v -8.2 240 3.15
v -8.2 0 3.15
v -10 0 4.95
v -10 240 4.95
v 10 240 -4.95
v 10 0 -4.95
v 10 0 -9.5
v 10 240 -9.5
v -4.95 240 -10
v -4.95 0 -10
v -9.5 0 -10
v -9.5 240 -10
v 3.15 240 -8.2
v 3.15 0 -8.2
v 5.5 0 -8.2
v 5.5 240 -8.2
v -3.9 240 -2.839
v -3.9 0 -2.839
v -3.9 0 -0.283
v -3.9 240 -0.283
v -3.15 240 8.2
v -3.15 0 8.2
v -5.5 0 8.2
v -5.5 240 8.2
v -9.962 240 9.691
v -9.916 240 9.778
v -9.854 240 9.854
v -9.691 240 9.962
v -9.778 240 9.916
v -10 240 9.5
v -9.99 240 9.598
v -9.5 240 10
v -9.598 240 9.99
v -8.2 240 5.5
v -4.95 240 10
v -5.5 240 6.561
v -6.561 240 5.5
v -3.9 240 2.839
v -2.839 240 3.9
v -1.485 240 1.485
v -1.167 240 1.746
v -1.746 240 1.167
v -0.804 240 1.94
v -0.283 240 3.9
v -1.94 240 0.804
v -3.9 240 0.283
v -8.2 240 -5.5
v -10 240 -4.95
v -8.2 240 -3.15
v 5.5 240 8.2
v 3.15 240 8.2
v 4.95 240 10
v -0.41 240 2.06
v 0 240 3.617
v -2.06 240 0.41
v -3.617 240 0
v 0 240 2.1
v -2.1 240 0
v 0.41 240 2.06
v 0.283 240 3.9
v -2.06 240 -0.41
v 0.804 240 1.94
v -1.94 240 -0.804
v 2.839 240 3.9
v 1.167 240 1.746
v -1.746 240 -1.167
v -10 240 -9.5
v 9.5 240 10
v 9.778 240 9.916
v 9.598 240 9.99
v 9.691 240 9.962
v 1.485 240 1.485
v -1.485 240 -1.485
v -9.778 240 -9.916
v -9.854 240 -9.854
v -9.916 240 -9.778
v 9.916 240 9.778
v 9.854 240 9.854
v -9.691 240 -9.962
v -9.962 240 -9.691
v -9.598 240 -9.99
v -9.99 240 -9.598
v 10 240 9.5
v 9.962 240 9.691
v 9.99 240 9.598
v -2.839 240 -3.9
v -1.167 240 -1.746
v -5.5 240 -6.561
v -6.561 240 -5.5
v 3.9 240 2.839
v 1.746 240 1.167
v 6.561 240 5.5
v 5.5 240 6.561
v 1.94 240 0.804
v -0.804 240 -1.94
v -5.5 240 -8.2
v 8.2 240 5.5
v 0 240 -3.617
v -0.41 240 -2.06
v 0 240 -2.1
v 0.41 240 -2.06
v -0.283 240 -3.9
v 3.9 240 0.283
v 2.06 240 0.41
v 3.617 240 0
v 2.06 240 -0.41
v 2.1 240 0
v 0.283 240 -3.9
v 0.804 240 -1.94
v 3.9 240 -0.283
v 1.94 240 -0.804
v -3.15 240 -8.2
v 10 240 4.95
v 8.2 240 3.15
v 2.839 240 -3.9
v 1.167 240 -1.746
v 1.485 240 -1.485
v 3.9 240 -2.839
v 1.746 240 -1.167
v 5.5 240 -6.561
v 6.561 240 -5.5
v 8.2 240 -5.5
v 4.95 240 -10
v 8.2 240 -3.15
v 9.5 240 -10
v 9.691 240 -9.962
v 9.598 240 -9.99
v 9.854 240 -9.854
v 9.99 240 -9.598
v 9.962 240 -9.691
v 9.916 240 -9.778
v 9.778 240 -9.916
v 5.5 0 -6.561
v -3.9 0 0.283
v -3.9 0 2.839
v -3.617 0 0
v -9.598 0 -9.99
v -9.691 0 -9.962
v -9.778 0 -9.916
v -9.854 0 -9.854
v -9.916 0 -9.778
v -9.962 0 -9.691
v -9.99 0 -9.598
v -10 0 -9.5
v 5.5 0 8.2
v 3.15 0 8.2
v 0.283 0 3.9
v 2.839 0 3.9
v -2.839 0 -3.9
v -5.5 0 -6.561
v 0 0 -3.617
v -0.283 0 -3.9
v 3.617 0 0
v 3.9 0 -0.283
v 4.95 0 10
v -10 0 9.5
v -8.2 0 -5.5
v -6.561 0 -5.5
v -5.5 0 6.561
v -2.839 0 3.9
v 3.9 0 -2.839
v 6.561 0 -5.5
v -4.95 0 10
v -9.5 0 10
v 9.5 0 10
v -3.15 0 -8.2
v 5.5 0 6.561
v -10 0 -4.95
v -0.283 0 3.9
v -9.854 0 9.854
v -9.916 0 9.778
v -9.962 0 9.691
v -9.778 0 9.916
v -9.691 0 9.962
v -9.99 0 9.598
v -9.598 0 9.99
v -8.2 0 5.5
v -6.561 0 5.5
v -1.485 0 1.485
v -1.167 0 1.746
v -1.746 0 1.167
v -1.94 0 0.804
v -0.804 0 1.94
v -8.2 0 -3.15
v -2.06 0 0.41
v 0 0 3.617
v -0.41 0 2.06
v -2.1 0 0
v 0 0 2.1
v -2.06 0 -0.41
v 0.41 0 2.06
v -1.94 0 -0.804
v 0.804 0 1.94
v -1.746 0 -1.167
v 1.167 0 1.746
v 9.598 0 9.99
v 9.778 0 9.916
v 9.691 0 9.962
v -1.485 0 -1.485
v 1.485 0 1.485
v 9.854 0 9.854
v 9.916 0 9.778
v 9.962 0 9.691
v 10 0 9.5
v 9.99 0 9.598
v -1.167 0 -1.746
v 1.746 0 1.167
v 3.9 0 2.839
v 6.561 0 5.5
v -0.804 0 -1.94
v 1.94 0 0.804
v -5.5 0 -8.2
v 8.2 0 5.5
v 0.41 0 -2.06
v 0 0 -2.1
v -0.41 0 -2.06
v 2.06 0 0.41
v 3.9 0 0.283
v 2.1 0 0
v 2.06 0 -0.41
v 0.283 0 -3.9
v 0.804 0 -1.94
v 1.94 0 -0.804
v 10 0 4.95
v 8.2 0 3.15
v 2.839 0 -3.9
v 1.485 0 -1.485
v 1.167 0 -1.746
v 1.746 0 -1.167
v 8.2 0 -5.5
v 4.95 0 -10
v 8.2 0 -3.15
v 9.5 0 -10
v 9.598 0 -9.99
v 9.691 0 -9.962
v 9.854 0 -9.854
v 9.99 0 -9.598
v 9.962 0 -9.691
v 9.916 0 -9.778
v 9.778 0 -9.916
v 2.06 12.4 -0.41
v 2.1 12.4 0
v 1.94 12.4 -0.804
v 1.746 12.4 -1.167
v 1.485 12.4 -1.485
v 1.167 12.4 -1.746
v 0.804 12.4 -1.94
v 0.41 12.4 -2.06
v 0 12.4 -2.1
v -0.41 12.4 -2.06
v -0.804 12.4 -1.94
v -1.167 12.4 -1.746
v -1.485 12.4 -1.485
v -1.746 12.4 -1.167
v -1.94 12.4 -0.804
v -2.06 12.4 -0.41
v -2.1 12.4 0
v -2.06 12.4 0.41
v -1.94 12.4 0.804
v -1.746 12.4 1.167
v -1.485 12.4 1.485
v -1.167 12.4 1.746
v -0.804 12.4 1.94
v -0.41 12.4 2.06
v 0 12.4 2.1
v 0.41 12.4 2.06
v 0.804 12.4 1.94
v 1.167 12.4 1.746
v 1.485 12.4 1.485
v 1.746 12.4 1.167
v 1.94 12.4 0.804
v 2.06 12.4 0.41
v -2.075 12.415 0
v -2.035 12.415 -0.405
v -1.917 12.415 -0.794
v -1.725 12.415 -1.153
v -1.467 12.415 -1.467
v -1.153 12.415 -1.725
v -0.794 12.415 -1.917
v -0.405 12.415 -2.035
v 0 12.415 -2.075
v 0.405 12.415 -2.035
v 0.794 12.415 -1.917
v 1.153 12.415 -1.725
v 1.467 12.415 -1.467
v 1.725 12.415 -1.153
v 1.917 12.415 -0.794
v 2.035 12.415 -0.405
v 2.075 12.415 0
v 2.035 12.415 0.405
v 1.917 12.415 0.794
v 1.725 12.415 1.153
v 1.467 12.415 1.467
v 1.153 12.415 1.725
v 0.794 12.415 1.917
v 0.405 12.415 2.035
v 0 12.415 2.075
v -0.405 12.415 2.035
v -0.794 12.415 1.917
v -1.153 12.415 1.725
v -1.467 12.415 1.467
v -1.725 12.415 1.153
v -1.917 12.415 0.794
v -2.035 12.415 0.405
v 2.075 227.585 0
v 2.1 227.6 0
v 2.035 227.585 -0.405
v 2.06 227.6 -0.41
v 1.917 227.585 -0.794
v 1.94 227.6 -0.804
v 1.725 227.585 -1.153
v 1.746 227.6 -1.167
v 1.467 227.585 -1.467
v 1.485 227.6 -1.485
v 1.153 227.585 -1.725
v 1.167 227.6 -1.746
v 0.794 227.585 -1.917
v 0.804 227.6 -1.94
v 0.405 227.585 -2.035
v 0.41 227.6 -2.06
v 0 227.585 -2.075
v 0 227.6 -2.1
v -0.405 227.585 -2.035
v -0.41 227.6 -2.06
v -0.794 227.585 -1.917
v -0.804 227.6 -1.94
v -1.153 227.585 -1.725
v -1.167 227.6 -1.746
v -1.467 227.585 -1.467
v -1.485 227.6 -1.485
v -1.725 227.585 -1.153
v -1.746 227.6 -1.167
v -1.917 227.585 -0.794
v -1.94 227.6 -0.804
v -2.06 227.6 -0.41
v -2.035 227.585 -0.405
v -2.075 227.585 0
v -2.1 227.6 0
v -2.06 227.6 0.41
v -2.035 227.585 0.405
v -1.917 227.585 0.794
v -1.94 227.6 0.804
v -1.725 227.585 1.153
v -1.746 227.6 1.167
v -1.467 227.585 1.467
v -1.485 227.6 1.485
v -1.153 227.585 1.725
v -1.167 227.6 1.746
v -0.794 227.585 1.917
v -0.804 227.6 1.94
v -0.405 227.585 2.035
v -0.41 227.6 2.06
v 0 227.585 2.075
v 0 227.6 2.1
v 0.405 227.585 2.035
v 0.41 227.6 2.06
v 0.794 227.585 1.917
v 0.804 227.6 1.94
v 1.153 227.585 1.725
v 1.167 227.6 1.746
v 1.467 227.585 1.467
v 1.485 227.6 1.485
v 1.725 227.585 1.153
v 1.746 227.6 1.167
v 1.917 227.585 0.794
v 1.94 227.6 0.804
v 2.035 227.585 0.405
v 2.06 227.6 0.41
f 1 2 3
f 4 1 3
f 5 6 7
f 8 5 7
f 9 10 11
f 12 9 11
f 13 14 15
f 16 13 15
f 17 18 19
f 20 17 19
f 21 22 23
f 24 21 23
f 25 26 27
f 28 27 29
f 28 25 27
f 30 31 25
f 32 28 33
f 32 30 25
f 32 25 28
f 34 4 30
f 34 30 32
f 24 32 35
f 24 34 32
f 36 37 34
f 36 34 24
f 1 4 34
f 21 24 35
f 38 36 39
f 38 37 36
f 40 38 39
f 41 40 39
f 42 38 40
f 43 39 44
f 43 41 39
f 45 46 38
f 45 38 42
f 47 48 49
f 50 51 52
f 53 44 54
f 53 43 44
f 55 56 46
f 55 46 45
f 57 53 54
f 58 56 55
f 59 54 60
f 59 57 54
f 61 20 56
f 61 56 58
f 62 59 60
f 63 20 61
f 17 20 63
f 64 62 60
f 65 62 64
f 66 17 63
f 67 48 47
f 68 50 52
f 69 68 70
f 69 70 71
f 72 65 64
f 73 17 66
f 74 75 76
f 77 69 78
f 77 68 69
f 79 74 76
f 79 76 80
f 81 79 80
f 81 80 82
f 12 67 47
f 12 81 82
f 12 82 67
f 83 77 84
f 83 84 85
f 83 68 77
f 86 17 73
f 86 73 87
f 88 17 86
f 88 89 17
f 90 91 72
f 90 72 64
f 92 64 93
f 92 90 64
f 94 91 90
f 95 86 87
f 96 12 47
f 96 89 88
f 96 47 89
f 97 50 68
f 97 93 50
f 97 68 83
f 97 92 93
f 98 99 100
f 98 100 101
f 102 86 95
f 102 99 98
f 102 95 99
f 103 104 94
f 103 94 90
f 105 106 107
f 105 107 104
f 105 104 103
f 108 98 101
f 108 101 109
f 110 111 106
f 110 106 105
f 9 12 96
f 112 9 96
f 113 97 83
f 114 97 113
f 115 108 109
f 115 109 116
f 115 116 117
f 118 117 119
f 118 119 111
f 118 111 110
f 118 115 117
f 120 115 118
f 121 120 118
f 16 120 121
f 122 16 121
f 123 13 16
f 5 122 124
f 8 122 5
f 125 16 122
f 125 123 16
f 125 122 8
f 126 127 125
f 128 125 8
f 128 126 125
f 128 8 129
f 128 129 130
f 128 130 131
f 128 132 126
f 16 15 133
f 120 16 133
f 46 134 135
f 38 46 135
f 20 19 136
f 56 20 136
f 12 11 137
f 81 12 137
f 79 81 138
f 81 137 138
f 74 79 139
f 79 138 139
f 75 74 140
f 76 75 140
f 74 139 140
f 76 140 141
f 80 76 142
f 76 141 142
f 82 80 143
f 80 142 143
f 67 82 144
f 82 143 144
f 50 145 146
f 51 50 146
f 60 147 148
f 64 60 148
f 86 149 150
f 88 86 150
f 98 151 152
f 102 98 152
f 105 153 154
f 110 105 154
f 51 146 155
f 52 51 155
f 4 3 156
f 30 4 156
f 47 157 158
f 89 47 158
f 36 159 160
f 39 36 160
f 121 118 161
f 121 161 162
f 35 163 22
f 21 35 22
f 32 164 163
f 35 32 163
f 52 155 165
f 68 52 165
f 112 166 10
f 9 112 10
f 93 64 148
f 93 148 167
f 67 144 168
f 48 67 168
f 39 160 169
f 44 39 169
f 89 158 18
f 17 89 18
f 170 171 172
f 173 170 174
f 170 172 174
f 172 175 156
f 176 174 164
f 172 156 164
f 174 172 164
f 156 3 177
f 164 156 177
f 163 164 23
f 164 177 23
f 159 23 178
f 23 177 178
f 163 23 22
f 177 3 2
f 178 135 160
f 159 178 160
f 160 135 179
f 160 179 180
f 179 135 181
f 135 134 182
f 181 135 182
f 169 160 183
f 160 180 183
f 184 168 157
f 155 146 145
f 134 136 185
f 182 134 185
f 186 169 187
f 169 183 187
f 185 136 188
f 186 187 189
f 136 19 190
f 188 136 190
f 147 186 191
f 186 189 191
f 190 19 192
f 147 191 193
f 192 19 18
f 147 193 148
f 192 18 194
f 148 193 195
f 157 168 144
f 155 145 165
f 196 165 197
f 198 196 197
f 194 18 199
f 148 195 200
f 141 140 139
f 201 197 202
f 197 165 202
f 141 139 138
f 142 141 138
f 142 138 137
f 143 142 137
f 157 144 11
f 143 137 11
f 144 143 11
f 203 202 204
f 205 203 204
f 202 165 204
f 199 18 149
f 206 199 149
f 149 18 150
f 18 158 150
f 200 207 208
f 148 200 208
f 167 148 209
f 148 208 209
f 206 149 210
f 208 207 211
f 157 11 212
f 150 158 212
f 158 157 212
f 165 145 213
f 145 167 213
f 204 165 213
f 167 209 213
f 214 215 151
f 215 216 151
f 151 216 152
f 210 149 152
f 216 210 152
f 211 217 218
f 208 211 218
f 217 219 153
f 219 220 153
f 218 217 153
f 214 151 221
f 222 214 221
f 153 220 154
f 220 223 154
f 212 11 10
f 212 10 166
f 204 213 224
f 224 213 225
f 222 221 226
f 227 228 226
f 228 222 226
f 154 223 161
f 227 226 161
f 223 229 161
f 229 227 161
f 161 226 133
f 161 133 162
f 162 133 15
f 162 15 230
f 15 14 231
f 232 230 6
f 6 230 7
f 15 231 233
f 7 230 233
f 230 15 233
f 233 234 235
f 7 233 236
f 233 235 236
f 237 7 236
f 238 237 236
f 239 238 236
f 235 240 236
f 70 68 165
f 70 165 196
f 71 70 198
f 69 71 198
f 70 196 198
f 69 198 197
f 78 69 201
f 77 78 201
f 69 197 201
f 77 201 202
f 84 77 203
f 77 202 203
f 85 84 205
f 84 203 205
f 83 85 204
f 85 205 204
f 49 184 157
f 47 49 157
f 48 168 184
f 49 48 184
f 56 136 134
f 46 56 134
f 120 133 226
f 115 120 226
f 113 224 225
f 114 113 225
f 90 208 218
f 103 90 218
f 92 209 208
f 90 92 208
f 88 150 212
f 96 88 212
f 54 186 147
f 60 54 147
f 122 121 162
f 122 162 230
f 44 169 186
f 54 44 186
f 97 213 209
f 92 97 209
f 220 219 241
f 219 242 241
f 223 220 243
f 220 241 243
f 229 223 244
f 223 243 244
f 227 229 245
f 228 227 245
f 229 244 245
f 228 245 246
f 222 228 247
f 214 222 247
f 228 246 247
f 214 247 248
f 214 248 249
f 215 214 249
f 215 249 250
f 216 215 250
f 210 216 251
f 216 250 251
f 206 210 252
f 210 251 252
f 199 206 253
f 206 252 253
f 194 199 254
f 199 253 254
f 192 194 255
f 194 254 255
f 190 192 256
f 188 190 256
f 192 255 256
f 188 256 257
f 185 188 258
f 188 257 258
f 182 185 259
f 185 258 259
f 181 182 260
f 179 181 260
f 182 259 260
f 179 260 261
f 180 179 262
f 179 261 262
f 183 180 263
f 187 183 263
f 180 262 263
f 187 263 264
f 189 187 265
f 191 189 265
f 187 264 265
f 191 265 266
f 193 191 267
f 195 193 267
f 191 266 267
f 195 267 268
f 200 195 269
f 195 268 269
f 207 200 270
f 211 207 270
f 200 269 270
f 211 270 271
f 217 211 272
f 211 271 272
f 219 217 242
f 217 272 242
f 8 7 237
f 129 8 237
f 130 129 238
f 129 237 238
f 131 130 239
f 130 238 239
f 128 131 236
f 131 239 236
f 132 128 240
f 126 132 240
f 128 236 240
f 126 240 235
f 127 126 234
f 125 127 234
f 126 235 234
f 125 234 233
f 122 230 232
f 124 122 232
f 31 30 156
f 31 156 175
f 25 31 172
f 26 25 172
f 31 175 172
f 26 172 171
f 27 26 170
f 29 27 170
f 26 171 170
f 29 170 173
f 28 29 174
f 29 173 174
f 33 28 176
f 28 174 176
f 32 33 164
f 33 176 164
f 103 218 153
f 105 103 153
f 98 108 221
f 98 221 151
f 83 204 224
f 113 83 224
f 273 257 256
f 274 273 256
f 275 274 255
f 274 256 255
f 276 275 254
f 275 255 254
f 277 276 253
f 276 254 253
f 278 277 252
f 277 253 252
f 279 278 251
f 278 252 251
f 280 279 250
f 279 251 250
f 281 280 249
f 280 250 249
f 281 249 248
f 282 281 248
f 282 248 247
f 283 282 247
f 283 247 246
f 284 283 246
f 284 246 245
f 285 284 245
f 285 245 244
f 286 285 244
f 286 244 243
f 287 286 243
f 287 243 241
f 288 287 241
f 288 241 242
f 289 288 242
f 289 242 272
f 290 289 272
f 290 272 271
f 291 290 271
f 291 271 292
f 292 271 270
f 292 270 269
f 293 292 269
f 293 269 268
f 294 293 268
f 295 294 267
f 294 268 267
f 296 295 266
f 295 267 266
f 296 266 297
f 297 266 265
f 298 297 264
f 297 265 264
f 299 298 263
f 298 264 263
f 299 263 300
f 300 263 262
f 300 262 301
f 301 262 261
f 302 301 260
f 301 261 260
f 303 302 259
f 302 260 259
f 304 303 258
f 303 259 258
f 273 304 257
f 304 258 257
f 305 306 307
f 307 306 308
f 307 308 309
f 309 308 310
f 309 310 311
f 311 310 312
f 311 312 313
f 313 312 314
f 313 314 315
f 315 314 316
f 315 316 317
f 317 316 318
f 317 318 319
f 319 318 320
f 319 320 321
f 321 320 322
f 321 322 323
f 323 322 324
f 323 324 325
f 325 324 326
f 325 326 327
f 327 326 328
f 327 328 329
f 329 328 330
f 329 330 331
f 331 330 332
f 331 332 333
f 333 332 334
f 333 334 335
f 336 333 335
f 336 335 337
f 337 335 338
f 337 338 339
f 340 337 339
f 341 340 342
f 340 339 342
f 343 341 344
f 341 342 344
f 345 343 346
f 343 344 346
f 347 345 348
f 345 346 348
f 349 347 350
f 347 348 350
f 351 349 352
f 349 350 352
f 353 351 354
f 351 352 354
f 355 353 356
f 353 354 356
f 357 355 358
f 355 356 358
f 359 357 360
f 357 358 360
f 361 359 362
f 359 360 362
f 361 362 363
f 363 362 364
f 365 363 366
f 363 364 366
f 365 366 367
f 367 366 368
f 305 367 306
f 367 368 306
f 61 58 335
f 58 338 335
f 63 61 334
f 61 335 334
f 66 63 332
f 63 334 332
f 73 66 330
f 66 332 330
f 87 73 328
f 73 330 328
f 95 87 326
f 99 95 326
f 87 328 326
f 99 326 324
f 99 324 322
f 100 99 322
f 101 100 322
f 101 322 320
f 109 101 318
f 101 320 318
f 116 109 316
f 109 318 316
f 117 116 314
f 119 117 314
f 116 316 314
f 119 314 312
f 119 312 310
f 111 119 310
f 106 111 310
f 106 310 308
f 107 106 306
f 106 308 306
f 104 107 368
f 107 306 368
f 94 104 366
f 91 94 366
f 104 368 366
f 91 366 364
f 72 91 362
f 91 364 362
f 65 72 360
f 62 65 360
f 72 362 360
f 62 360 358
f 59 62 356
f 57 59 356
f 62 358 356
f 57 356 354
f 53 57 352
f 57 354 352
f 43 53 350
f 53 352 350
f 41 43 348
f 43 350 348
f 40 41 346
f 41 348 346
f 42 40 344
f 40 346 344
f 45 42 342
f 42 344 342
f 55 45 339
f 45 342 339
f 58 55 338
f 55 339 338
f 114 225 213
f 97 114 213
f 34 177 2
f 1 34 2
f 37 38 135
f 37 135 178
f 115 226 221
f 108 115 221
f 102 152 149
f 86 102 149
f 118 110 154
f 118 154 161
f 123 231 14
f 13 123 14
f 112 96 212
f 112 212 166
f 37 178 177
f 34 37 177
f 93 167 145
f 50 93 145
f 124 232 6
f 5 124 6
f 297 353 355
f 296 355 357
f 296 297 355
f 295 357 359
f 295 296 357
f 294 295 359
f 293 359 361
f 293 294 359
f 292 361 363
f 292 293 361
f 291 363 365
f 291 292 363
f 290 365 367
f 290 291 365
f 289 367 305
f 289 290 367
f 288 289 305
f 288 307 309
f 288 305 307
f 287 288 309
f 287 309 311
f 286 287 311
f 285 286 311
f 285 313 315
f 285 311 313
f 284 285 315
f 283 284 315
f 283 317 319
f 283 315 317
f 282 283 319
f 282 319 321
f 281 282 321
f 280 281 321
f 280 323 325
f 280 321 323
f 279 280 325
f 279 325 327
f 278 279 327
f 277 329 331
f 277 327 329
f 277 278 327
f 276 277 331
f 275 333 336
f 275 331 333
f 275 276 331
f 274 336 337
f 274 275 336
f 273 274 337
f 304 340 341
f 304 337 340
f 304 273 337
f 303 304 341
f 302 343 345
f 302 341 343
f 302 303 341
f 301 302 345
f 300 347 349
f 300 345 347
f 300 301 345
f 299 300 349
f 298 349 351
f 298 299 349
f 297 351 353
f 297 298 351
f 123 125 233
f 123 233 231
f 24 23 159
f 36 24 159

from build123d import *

# Parameters (mm, degrees)
SKETCH_28_R               = 2.075
EXTRUDE_2020V_DEPTH       = 240
HOLE_WIZARD_1_2020V_D     = 4.2
HOLE_WIZARD_1_2020V_DEPTH = 12.4
HOLE_WIZARD_1_2020V_TIP   = 1.2618073
HOLE_WIZARD_2_2020V_D     = 4.2
HOLE_WIZARD_2_2020V_DEPTH = 12.4
HOLE_WIZARD_2_2020V_TIP   = 1.2618073


with BuildPart() as part:
    # 草图28 → 2020V (new body)
    with BuildSketch(Plane(origin=(0, 0, 0), x_dir=(1, 0, 0), z_dir=(0, 1, 0))):
        with BuildLine():
            Line((-3.900000395, 2.839340223), (-3.900000395, 0.282843107))
            Line((-3.900000395, 0.282843107), (-3.617157288, 0))
            Line((-3.617157288, 0), (-3.9, -0.282842712))
            Line((-3.9, -0.282842712), (-3.9, -2.839339828))
            Line((-3.9, -2.839339828), (-6.560660172, -5.5))
            Line((-6.560660172, -5.5), (-8.2, -5.5))
            Line((-8.2, -5.5), (-8.2, -3.150000255))
            Line((-8.2, -3.150000255), (-10, -4.950000255))
            Line((-10, -4.950000255), (-10, -9.5))
            ThreePointArc((-10, -9.5), (-9.853553391, -9.853553391), (-9.5, -10))
            Line((-9.5, -10), (-4.950000255, -10))
            Line((-4.950000255, -10), (-3.150000255, -8.2))
            Line((-3.150000255, -8.2), (-5.5, -8.2))
            Line((-5.5, -8.2), (-5.5, -6.560660172))
            Line((-5.5, -6.560660172), (-2.839339828, -3.9))
            Line((-2.839339828, -3.9), (-0.282842712, -3.9))
            Line((-0.282842712, -3.9), (0, -3.617157288))
            Line((0, -3.617157288), (0.282842712, -3.9))
            Line((0.282842712, -3.9), (2.839339828, -3.9))
            Line((2.839339828, -3.9), (5.5, -6.560660172))
            Line((5.5, -6.560660172), (5.5, -8.2))
            Line((5.5, -8.2), (3.150000255, -8.2))
            Line((3.150000255, -8.2), (4.950000255, -10))
            Line((4.950000255, -10), (9.5, -10))
            ThreePointArc((9.5, -10), (9.853553391, -9.853553391), (10, -9.5))
            Line((10, -9.5), (10, -4.950000255))
            Line((10, -4.950000255), (8.2, -3.150000255))
            Line((8.2, -3.150000255), (8.2, -5.5))
            Line((8.2, -5.5), (6.560660172, -5.5))
            Line((6.560660172, -5.5), (3.9, -2.839339828))
            Line((3.9, -2.839339828), (3.9, -0.282842712))
            Line((3.9, -0.282842712), (3.617157288, 0))
            Line((3.617157288, 0), (3.900000116, 0.282842829))
            Line((3.900000116, 0.282842829), (3.900000116, 2.839339944))
            Line((3.900000116, 2.839339944), (6.560660288, 5.500000116))
            Line((6.560660288, 5.500000116), (8.200000116, 5.500000116))
            Line((8.200000116, 5.500000116), (8.200000116, 3.150000371))
            Line((8.200000116, 3.150000371), (10.000000116, 4.950000371))
            Line((10.000000116, 4.950000371), (10.000000116, 9.499999884))
            ThreePointArc((10.000000116, 9.499999884), (9.853553507, 9.853553275), (9.500000116, 9.999999884))
            Line((9.500000116, 9.999999884), (4.950000139, 9.999999884))
            Line((4.950000139, 9.999999884), (3.150000139, 8.199999884))
            Line((3.150000139, 8.199999884), (5.499999884, 8.199999884))
            Line((5.499999884, 8.199999884), (5.499999884, 6.560660056))
            Line((5.499999884, 6.560660056), (2.839339712, 3.899999884))
            Line((2.839339712, 3.899999884), (0.282842991, 3.899999884))
            Line((0.282842991, 3.899999884), (0, 3.617156893))
            Line((0, 3.617156893), (-0.282842712, 3.899999605))
            Line((-0.282842712, 3.899999605), (-2.839339434, 3.899999605))
            Line((-2.839339434, 3.899999605), (-5.499999605, 6.560659777))
            Line((-5.499999605, 6.560659777), (-5.499999605, 8.199999605))
            Line((-5.499999605, 8.199999605), (-3.149999861, 8.199999605))
            Line((-3.149999861, 8.199999605), (-4.949999861, 9.999999605))
            Line((-4.949999861, 9.999999605), (-9.500000395, 9.999999605))
            ThreePointArc((-9.500000395, 9.999999605), (-9.853553785, 9.853552996), (-10.000000395, 9.499999605))
            Line((-10.000000395, 9.499999605), (-10.000000395, 4.95000065))
            Line((-10.000000395, 4.95000065), (-8.200000395, 3.15000065))
            Line((-8.200000395, 3.15000065), (-8.200000395, 5.500000395))
            Line((-8.200000395, 5.500000395), (-6.560660566, 5.500000395))
            Line((-6.560660566, 5.500000395), (-3.900000395, 2.839340223))
        make_face()
        with Locations(Location((0, 0, 0), (0, 0, 270))):
            Circle(SKETCH_28_R, mode=Mode.SUBTRACT)
    extrude(amount=EXTRUDE_2020V_DEPTH)

    # 1-2020V
    with Locations(Plane(origin=(0, 240, 0), x_dir=(1, 0, 0), z_dir=(0, 1, 0))):
        with Locations((0, 0)):
            Hole(HOLE_WIZARD_1_2020V_D / 2, depth=HOLE_WIZARD_1_2020V_DEPTH)
            with Locations((0, 0, -(HOLE_WIZARD_1_2020V_DEPTH + HOLE_WIZARD_1_2020V_TIP / 2))):  # 118° drill point
                Cone(0, HOLE_WIZARD_1_2020V_D / 2, HOLE_WIZARD_1_2020V_TIP, mode=Mode.SUBTRACT)

    # 2-2020V
    with Locations(Plane(origin=(0, 0, 0), x_dir=(-1, 0, 0), z_dir=(0, -1, 0))):
        with Locations((0, 0)):
            Hole(HOLE_WIZARD_2_2020V_D / 2, depth=HOLE_WIZARD_2_2020V_DEPTH)
            with Locations((0, 0, -(HOLE_WIZARD_2_2020V_DEPTH + HOLE_WIZARD_2_2020V_TIP / 2))):  # 118° drill point
                Cone(0, HOLE_WIZARD_2_2020V_D / 2, HOLE_WIZARD_2_2020V_TIP, mode=Mode.SUBTRACT)


solid = part.part
